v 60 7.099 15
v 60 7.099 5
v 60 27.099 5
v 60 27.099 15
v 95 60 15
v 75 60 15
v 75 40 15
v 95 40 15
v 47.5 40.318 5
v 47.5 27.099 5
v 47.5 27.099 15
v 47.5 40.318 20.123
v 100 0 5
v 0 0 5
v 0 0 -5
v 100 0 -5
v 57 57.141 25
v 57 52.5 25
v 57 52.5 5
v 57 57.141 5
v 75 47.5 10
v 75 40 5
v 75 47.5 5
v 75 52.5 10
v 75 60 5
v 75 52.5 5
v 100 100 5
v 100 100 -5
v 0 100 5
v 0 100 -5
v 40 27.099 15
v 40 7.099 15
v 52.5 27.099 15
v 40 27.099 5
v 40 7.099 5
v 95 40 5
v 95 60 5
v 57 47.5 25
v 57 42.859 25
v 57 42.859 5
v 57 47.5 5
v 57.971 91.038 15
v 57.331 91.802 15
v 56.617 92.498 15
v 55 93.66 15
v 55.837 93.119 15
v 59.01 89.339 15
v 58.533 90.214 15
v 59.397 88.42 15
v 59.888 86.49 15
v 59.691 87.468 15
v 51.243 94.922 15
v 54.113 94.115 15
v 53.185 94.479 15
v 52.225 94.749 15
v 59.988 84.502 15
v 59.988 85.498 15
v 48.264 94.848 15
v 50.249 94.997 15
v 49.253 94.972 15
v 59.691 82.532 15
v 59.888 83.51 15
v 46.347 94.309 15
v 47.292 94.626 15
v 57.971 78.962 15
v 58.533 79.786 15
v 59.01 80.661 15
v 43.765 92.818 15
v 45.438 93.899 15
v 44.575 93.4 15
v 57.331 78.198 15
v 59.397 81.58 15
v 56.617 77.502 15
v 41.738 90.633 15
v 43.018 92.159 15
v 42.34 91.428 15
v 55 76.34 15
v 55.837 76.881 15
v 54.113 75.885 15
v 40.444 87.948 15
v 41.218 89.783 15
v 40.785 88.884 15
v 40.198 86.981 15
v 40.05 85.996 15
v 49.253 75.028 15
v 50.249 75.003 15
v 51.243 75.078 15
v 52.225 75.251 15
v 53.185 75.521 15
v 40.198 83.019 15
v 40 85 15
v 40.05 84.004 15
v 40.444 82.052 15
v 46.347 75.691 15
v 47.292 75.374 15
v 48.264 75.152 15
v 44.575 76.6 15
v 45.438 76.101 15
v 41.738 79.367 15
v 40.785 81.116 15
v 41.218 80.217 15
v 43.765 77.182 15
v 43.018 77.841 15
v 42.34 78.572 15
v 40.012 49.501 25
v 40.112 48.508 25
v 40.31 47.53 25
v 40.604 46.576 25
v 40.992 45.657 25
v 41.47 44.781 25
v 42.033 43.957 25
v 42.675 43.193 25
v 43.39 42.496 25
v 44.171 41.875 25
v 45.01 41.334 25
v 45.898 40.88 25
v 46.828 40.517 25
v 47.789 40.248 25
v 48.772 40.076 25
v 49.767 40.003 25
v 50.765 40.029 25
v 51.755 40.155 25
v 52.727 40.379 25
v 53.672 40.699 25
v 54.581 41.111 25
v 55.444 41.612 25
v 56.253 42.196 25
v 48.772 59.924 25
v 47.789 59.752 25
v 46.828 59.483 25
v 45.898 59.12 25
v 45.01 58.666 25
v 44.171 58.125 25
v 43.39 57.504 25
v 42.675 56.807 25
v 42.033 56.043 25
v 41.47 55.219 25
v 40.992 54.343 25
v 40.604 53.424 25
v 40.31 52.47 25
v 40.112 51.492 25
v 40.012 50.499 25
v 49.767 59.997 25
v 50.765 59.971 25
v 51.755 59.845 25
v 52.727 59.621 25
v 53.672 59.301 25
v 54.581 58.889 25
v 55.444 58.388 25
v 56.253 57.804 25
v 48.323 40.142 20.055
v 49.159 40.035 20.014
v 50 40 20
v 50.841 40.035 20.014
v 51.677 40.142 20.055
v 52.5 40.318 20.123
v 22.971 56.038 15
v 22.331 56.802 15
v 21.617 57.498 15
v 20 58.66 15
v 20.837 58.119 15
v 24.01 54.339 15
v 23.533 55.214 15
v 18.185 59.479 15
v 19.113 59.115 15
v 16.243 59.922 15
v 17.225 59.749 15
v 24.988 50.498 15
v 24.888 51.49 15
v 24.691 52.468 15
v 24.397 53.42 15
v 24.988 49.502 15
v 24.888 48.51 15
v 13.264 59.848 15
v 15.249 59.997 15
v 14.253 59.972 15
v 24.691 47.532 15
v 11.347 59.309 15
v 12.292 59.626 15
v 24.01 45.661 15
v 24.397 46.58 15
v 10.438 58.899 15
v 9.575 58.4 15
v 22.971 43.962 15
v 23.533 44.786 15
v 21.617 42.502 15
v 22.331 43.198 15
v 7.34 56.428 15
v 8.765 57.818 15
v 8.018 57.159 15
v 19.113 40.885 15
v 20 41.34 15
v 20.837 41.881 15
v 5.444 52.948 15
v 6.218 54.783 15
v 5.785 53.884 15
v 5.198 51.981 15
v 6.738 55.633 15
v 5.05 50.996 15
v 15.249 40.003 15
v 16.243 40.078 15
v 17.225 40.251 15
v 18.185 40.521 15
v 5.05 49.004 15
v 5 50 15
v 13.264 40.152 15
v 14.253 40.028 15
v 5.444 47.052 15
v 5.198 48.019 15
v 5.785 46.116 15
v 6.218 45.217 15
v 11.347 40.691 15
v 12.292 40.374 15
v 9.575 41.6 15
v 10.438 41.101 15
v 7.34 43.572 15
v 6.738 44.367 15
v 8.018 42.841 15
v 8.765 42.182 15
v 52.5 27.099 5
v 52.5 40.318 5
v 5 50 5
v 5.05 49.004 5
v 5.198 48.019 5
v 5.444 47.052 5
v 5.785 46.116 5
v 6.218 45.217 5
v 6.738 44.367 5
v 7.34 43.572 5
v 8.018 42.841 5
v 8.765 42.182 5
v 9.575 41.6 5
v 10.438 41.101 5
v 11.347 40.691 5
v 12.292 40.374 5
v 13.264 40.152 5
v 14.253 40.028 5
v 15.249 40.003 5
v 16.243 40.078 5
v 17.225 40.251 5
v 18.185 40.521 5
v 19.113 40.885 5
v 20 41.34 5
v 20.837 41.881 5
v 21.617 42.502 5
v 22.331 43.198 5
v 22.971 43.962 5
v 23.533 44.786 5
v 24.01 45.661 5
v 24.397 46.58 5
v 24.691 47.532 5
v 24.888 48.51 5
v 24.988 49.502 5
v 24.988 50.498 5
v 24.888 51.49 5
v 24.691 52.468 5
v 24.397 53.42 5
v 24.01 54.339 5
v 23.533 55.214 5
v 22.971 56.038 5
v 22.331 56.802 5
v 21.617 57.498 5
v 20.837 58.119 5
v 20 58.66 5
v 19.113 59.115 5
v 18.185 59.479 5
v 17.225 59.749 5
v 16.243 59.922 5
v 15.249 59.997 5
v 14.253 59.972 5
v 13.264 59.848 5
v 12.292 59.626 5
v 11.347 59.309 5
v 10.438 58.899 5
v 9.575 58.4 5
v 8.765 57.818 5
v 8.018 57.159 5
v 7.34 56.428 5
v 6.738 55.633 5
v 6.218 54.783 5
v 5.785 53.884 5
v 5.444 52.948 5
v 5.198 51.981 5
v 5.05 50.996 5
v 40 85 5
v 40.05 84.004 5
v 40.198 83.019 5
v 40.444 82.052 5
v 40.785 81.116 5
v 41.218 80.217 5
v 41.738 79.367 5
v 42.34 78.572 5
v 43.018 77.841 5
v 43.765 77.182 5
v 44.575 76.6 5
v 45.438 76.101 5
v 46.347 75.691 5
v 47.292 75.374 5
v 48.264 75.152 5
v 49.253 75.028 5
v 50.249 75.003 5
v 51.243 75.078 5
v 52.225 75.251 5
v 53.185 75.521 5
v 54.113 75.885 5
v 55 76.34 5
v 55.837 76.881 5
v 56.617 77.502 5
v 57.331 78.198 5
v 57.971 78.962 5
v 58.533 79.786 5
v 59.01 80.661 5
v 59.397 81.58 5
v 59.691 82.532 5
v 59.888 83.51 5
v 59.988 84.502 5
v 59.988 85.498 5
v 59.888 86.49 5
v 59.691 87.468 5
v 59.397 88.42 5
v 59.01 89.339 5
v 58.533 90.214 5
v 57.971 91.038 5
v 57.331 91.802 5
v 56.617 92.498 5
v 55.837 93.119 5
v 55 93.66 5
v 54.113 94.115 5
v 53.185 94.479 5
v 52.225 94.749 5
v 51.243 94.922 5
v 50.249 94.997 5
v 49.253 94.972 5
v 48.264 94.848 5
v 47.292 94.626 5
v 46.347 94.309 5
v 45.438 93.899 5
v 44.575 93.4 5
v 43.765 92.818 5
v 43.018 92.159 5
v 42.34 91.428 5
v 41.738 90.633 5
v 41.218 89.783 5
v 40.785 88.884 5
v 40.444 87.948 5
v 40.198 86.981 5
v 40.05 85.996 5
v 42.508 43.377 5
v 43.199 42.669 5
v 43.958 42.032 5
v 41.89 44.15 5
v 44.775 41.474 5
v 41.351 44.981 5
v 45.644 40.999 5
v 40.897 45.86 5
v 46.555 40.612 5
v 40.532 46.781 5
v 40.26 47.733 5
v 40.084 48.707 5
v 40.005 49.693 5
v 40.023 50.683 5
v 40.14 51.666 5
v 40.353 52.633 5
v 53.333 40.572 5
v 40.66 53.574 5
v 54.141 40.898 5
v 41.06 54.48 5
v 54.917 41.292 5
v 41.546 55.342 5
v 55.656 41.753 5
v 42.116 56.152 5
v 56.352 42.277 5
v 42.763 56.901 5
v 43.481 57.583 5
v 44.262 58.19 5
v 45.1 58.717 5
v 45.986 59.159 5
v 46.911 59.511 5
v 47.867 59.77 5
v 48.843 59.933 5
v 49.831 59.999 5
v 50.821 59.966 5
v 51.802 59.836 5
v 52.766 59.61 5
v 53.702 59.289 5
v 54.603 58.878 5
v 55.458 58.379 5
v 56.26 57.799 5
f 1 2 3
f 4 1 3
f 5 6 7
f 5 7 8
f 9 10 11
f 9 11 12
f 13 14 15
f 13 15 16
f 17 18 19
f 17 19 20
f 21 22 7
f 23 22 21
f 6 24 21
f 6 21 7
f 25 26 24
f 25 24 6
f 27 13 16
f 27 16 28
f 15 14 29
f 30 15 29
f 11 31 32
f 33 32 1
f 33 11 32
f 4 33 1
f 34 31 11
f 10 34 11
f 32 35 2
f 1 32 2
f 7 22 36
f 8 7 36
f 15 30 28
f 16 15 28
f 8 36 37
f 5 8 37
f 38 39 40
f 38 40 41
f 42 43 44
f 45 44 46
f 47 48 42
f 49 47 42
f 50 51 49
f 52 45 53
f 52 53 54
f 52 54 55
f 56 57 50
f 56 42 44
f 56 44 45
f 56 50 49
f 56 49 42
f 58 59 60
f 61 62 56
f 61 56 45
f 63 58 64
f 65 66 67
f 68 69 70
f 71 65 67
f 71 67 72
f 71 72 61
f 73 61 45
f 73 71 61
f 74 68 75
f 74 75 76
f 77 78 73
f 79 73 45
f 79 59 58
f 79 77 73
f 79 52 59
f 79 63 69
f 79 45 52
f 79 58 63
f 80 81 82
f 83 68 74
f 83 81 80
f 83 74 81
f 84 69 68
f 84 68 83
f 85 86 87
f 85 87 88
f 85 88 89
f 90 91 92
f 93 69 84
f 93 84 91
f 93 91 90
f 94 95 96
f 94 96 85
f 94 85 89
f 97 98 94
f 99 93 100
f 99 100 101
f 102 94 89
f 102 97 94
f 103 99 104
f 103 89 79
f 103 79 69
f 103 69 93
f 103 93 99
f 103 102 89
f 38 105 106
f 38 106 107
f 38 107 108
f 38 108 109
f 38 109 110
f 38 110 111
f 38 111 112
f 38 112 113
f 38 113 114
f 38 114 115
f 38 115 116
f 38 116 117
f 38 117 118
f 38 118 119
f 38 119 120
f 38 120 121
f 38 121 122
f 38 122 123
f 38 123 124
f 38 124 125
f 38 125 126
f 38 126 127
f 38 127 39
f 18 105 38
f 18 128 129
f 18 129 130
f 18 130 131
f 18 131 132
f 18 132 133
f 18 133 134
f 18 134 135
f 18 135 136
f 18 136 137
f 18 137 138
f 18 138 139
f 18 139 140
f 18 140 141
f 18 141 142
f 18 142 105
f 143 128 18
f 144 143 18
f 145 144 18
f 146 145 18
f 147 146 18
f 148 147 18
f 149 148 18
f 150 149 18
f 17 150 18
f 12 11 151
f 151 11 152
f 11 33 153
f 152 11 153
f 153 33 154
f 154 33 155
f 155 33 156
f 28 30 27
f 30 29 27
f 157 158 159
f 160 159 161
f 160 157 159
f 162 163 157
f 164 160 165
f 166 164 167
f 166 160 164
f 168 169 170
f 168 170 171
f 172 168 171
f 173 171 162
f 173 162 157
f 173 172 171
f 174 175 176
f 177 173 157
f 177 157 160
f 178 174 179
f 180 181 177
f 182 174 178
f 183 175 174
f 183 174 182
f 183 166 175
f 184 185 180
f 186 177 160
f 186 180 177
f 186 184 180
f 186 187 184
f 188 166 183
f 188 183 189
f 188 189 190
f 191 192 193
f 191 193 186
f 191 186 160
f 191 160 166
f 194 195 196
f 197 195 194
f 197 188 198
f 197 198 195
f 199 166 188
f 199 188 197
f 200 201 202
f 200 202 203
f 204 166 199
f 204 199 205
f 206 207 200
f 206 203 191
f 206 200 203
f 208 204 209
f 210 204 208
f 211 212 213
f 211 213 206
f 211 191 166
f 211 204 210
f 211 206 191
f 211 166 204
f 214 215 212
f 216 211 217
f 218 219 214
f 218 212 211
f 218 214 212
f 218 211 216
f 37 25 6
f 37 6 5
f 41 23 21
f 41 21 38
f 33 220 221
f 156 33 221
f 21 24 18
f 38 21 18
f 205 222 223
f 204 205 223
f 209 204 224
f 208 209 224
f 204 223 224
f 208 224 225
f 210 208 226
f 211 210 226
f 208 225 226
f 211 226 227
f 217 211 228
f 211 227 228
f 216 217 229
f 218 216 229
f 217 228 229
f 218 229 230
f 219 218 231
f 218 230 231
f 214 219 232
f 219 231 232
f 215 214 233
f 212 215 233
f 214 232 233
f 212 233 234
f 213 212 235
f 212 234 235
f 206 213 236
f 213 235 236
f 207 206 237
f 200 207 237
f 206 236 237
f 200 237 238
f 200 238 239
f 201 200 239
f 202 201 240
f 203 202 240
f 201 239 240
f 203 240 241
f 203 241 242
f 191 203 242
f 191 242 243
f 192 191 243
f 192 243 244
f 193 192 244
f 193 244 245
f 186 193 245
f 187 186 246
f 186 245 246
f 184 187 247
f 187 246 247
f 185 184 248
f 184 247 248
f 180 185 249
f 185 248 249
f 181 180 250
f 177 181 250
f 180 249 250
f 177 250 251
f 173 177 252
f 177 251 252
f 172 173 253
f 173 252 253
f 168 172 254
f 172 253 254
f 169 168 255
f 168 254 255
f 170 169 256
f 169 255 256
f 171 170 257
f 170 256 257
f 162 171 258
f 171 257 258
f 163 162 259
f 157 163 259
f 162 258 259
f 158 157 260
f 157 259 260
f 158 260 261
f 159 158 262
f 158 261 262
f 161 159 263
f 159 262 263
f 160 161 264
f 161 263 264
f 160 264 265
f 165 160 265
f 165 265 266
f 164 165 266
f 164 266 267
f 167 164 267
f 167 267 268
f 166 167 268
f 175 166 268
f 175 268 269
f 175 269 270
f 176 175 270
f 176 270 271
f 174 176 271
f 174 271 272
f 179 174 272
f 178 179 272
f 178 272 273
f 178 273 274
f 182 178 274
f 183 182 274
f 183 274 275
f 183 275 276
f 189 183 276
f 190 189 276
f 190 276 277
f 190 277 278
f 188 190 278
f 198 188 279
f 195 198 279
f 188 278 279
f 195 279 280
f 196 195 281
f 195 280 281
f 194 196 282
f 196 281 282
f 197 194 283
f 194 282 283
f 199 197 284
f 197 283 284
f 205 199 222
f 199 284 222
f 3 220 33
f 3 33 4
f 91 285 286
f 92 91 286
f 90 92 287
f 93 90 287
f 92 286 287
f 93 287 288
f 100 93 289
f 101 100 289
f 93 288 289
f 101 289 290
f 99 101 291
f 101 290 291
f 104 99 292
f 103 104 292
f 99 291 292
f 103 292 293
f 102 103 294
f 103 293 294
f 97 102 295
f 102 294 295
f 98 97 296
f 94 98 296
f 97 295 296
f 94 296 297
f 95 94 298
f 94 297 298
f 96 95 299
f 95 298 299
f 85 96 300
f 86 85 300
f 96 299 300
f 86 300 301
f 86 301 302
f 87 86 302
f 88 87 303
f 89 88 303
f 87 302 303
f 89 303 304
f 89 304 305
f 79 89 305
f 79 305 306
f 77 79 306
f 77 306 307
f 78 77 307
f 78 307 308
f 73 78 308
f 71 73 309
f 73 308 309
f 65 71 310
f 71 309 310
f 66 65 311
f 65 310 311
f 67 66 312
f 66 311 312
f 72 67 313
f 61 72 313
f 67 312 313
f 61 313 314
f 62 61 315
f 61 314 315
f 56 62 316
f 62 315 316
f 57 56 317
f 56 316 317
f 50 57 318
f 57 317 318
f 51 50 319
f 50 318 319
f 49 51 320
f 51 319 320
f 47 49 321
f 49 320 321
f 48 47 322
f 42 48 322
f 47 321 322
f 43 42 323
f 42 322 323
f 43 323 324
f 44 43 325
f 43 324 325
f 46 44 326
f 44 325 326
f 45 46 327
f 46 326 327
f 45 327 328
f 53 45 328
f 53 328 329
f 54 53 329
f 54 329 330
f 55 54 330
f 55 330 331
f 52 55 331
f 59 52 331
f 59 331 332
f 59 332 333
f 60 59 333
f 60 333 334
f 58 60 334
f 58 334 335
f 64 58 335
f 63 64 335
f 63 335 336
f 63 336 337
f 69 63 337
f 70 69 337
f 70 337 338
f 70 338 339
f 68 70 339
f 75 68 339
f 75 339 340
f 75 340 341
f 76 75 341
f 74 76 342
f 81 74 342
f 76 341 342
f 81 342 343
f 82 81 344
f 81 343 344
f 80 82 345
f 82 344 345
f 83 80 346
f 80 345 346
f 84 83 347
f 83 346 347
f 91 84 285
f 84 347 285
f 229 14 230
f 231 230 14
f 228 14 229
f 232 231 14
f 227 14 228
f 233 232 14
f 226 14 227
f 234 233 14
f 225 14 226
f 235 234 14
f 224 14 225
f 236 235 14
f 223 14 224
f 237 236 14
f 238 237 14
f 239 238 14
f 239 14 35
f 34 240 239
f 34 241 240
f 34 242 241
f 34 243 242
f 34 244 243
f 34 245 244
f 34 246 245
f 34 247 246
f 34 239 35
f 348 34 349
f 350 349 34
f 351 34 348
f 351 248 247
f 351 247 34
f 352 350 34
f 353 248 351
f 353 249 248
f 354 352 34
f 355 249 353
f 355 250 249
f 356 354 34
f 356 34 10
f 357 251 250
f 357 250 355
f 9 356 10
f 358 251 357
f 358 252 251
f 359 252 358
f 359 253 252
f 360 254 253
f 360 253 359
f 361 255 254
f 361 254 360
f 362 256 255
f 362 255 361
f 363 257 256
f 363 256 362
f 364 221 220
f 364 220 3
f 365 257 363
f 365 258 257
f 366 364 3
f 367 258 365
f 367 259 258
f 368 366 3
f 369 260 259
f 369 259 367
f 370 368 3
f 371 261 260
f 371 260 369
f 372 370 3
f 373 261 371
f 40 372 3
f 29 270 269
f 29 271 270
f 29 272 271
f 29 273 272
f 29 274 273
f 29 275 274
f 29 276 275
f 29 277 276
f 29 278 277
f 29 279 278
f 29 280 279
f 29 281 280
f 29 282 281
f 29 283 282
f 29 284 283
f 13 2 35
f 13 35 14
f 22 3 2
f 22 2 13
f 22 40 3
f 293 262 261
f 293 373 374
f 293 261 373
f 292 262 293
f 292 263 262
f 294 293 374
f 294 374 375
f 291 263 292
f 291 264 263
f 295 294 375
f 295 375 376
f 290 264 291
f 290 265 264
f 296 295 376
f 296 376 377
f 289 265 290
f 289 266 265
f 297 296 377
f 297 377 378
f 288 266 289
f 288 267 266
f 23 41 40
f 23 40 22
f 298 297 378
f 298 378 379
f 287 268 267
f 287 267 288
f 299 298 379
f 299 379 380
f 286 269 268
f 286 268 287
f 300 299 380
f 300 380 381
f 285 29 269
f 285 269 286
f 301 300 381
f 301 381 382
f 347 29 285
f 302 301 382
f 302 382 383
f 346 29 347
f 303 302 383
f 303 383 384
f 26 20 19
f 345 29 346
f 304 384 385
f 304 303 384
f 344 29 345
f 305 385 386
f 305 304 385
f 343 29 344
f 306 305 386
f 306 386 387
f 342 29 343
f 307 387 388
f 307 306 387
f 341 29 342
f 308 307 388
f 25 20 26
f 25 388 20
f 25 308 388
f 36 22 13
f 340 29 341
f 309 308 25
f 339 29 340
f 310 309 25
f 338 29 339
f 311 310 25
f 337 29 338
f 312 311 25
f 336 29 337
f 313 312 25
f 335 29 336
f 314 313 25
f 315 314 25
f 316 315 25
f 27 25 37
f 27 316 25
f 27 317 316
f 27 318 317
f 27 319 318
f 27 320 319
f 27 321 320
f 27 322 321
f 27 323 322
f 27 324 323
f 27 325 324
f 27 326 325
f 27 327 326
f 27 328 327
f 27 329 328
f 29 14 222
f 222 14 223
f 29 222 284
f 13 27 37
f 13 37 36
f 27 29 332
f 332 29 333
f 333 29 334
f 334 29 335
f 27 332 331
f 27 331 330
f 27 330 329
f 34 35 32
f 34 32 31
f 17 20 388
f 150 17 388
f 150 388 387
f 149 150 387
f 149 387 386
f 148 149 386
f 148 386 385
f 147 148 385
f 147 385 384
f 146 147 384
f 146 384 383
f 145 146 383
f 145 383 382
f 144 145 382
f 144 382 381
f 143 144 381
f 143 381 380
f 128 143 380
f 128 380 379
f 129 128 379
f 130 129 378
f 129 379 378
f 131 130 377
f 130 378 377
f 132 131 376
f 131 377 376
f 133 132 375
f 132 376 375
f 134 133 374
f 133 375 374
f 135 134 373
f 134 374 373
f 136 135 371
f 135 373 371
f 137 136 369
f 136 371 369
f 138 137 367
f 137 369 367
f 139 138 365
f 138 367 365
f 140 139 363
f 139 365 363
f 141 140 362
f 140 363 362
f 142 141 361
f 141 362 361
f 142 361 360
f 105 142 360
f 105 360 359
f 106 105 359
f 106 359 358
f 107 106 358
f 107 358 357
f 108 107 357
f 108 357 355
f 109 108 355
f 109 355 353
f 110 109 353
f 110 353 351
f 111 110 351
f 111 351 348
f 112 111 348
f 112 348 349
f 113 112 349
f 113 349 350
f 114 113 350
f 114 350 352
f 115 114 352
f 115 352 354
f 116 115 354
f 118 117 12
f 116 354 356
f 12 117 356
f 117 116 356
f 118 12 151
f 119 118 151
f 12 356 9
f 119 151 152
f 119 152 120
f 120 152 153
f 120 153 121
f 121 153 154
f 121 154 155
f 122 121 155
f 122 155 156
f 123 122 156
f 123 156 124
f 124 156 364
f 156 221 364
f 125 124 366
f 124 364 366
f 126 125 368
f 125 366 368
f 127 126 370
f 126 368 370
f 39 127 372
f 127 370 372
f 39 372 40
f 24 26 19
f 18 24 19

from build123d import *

# Parameters (mm, degrees)
SCHIZZO1_W                   = 100
SCHIZZO1_H                   = 100
ESTRUSIONE_ESTRUSIONE1_DEPTH = 5
SCHIZZO2_W                   = 20
SCHIZZO2_H                   = 20
SCHIZZO2_R                   = 10
ESTRUSIONE_ESTRUSIONE2_DEPTH = 10
ESTRUSIONE_ESTRUSIONE3_DEPTH = 20
NERVATURA6_REACH             = 116.564
SCHIZZO17_WALL_W             = 254.559533776
SCHIZZO17_WALL_H             = 5
NERVATURA7_REACH             = 116.564
SCHIZZO19_WALL_W             = 244.96518431
SCHIZZO19_WALL_H             = 5


with BuildPart() as part:
    # Schizzo1 → Estrusione-Estrusione1 (new, symmetric)
    with BuildSketch(Plane.XY):
        with Locations((50, 50)):
            Rectangle(SCHIZZO1_W, SCHIZZO1_H)
    extrude(amount=ESTRUSIONE_ESTRUSIONE1_DEPTH, both=True)

    # Schizzo2 → Estrusione-Estrusione2 (add)
    with BuildSketch(Plane.XY.offset(5)):
        with Locations((85, 50)):
            Rectangle(SCHIZZO2_W, SCHIZZO2_H)
        with Locations((50, 17.098606554)):
            Rectangle(SCHIZZO2_W, SCHIZZO2_H)
        with Locations((50, 85)):
            Circle(SCHIZZO2_R)
        with Locations((15, 50)):
            Circle(SCHIZZO2_R)
    extrude(amount=ESTRUSIONE_ESTRUSIONE2_DEPTH)

    # Schizzo2<3> → Estrusione-Estrusione3 (add)
    with BuildSketch(Plane.XY.offset(5)):
        with BuildLine():
            Line((57, 42.858571571), (57, 57.141428429))
            ThreePointArc((57, 57.141428429), (40, 50), (57, 42.858571571))
        make_face()
    extrude(amount=ESTRUSIONE_ESTRUSIONE3_DEPTH)

    # Schizzo17 wall → Nervatura6 (add, up to next)
    with BuildSketch(Plane(origin=(66, 50, 17.5), x_dir=(-0.768221279597, 0, 0.640184399664), z_dir=(-0.640184399664, 0, -0.768221279597)), mode=Mode.PRIVATE) as nervatura6_sk1:
        Rectangle(SCHIZZO17_WALL_W, SCHIZZO17_WALL_H)
    nervatura6_tool1 = extrude(nervatura6_sk1.sketch, amount=NERVATURA6_REACH, mode=Mode.PRIVATE) - part.part
    add(nervatura6_tool1.solids().sort_by_distance((66, 50, 17.5))[0])

    # Schizzo19 wall → Nervatura7 (add, up to next)
    with BuildSketch(Plane(origin=(50, 33.549303277, 17.5), x_dir=(0, 0.932424174937, 0.361365684583), z_dir=(0, 0.361365684583, -0.932424174937)), mode=Mode.PRIVATE) as nervatura7_sk1:
        Rectangle(SCHIZZO19_WALL_W, SCHIZZO19_WALL_H)
    nervatura7_tool1 = extrude(nervatura7_sk1.sketch, amount=NERVATURA7_REACH, mode=Mode.PRIVATE) - part.part
    add(nervatura7_tool1.solids().sort_by_distance((50, 33.549303277, 17.5))[0])


solid = part.part
